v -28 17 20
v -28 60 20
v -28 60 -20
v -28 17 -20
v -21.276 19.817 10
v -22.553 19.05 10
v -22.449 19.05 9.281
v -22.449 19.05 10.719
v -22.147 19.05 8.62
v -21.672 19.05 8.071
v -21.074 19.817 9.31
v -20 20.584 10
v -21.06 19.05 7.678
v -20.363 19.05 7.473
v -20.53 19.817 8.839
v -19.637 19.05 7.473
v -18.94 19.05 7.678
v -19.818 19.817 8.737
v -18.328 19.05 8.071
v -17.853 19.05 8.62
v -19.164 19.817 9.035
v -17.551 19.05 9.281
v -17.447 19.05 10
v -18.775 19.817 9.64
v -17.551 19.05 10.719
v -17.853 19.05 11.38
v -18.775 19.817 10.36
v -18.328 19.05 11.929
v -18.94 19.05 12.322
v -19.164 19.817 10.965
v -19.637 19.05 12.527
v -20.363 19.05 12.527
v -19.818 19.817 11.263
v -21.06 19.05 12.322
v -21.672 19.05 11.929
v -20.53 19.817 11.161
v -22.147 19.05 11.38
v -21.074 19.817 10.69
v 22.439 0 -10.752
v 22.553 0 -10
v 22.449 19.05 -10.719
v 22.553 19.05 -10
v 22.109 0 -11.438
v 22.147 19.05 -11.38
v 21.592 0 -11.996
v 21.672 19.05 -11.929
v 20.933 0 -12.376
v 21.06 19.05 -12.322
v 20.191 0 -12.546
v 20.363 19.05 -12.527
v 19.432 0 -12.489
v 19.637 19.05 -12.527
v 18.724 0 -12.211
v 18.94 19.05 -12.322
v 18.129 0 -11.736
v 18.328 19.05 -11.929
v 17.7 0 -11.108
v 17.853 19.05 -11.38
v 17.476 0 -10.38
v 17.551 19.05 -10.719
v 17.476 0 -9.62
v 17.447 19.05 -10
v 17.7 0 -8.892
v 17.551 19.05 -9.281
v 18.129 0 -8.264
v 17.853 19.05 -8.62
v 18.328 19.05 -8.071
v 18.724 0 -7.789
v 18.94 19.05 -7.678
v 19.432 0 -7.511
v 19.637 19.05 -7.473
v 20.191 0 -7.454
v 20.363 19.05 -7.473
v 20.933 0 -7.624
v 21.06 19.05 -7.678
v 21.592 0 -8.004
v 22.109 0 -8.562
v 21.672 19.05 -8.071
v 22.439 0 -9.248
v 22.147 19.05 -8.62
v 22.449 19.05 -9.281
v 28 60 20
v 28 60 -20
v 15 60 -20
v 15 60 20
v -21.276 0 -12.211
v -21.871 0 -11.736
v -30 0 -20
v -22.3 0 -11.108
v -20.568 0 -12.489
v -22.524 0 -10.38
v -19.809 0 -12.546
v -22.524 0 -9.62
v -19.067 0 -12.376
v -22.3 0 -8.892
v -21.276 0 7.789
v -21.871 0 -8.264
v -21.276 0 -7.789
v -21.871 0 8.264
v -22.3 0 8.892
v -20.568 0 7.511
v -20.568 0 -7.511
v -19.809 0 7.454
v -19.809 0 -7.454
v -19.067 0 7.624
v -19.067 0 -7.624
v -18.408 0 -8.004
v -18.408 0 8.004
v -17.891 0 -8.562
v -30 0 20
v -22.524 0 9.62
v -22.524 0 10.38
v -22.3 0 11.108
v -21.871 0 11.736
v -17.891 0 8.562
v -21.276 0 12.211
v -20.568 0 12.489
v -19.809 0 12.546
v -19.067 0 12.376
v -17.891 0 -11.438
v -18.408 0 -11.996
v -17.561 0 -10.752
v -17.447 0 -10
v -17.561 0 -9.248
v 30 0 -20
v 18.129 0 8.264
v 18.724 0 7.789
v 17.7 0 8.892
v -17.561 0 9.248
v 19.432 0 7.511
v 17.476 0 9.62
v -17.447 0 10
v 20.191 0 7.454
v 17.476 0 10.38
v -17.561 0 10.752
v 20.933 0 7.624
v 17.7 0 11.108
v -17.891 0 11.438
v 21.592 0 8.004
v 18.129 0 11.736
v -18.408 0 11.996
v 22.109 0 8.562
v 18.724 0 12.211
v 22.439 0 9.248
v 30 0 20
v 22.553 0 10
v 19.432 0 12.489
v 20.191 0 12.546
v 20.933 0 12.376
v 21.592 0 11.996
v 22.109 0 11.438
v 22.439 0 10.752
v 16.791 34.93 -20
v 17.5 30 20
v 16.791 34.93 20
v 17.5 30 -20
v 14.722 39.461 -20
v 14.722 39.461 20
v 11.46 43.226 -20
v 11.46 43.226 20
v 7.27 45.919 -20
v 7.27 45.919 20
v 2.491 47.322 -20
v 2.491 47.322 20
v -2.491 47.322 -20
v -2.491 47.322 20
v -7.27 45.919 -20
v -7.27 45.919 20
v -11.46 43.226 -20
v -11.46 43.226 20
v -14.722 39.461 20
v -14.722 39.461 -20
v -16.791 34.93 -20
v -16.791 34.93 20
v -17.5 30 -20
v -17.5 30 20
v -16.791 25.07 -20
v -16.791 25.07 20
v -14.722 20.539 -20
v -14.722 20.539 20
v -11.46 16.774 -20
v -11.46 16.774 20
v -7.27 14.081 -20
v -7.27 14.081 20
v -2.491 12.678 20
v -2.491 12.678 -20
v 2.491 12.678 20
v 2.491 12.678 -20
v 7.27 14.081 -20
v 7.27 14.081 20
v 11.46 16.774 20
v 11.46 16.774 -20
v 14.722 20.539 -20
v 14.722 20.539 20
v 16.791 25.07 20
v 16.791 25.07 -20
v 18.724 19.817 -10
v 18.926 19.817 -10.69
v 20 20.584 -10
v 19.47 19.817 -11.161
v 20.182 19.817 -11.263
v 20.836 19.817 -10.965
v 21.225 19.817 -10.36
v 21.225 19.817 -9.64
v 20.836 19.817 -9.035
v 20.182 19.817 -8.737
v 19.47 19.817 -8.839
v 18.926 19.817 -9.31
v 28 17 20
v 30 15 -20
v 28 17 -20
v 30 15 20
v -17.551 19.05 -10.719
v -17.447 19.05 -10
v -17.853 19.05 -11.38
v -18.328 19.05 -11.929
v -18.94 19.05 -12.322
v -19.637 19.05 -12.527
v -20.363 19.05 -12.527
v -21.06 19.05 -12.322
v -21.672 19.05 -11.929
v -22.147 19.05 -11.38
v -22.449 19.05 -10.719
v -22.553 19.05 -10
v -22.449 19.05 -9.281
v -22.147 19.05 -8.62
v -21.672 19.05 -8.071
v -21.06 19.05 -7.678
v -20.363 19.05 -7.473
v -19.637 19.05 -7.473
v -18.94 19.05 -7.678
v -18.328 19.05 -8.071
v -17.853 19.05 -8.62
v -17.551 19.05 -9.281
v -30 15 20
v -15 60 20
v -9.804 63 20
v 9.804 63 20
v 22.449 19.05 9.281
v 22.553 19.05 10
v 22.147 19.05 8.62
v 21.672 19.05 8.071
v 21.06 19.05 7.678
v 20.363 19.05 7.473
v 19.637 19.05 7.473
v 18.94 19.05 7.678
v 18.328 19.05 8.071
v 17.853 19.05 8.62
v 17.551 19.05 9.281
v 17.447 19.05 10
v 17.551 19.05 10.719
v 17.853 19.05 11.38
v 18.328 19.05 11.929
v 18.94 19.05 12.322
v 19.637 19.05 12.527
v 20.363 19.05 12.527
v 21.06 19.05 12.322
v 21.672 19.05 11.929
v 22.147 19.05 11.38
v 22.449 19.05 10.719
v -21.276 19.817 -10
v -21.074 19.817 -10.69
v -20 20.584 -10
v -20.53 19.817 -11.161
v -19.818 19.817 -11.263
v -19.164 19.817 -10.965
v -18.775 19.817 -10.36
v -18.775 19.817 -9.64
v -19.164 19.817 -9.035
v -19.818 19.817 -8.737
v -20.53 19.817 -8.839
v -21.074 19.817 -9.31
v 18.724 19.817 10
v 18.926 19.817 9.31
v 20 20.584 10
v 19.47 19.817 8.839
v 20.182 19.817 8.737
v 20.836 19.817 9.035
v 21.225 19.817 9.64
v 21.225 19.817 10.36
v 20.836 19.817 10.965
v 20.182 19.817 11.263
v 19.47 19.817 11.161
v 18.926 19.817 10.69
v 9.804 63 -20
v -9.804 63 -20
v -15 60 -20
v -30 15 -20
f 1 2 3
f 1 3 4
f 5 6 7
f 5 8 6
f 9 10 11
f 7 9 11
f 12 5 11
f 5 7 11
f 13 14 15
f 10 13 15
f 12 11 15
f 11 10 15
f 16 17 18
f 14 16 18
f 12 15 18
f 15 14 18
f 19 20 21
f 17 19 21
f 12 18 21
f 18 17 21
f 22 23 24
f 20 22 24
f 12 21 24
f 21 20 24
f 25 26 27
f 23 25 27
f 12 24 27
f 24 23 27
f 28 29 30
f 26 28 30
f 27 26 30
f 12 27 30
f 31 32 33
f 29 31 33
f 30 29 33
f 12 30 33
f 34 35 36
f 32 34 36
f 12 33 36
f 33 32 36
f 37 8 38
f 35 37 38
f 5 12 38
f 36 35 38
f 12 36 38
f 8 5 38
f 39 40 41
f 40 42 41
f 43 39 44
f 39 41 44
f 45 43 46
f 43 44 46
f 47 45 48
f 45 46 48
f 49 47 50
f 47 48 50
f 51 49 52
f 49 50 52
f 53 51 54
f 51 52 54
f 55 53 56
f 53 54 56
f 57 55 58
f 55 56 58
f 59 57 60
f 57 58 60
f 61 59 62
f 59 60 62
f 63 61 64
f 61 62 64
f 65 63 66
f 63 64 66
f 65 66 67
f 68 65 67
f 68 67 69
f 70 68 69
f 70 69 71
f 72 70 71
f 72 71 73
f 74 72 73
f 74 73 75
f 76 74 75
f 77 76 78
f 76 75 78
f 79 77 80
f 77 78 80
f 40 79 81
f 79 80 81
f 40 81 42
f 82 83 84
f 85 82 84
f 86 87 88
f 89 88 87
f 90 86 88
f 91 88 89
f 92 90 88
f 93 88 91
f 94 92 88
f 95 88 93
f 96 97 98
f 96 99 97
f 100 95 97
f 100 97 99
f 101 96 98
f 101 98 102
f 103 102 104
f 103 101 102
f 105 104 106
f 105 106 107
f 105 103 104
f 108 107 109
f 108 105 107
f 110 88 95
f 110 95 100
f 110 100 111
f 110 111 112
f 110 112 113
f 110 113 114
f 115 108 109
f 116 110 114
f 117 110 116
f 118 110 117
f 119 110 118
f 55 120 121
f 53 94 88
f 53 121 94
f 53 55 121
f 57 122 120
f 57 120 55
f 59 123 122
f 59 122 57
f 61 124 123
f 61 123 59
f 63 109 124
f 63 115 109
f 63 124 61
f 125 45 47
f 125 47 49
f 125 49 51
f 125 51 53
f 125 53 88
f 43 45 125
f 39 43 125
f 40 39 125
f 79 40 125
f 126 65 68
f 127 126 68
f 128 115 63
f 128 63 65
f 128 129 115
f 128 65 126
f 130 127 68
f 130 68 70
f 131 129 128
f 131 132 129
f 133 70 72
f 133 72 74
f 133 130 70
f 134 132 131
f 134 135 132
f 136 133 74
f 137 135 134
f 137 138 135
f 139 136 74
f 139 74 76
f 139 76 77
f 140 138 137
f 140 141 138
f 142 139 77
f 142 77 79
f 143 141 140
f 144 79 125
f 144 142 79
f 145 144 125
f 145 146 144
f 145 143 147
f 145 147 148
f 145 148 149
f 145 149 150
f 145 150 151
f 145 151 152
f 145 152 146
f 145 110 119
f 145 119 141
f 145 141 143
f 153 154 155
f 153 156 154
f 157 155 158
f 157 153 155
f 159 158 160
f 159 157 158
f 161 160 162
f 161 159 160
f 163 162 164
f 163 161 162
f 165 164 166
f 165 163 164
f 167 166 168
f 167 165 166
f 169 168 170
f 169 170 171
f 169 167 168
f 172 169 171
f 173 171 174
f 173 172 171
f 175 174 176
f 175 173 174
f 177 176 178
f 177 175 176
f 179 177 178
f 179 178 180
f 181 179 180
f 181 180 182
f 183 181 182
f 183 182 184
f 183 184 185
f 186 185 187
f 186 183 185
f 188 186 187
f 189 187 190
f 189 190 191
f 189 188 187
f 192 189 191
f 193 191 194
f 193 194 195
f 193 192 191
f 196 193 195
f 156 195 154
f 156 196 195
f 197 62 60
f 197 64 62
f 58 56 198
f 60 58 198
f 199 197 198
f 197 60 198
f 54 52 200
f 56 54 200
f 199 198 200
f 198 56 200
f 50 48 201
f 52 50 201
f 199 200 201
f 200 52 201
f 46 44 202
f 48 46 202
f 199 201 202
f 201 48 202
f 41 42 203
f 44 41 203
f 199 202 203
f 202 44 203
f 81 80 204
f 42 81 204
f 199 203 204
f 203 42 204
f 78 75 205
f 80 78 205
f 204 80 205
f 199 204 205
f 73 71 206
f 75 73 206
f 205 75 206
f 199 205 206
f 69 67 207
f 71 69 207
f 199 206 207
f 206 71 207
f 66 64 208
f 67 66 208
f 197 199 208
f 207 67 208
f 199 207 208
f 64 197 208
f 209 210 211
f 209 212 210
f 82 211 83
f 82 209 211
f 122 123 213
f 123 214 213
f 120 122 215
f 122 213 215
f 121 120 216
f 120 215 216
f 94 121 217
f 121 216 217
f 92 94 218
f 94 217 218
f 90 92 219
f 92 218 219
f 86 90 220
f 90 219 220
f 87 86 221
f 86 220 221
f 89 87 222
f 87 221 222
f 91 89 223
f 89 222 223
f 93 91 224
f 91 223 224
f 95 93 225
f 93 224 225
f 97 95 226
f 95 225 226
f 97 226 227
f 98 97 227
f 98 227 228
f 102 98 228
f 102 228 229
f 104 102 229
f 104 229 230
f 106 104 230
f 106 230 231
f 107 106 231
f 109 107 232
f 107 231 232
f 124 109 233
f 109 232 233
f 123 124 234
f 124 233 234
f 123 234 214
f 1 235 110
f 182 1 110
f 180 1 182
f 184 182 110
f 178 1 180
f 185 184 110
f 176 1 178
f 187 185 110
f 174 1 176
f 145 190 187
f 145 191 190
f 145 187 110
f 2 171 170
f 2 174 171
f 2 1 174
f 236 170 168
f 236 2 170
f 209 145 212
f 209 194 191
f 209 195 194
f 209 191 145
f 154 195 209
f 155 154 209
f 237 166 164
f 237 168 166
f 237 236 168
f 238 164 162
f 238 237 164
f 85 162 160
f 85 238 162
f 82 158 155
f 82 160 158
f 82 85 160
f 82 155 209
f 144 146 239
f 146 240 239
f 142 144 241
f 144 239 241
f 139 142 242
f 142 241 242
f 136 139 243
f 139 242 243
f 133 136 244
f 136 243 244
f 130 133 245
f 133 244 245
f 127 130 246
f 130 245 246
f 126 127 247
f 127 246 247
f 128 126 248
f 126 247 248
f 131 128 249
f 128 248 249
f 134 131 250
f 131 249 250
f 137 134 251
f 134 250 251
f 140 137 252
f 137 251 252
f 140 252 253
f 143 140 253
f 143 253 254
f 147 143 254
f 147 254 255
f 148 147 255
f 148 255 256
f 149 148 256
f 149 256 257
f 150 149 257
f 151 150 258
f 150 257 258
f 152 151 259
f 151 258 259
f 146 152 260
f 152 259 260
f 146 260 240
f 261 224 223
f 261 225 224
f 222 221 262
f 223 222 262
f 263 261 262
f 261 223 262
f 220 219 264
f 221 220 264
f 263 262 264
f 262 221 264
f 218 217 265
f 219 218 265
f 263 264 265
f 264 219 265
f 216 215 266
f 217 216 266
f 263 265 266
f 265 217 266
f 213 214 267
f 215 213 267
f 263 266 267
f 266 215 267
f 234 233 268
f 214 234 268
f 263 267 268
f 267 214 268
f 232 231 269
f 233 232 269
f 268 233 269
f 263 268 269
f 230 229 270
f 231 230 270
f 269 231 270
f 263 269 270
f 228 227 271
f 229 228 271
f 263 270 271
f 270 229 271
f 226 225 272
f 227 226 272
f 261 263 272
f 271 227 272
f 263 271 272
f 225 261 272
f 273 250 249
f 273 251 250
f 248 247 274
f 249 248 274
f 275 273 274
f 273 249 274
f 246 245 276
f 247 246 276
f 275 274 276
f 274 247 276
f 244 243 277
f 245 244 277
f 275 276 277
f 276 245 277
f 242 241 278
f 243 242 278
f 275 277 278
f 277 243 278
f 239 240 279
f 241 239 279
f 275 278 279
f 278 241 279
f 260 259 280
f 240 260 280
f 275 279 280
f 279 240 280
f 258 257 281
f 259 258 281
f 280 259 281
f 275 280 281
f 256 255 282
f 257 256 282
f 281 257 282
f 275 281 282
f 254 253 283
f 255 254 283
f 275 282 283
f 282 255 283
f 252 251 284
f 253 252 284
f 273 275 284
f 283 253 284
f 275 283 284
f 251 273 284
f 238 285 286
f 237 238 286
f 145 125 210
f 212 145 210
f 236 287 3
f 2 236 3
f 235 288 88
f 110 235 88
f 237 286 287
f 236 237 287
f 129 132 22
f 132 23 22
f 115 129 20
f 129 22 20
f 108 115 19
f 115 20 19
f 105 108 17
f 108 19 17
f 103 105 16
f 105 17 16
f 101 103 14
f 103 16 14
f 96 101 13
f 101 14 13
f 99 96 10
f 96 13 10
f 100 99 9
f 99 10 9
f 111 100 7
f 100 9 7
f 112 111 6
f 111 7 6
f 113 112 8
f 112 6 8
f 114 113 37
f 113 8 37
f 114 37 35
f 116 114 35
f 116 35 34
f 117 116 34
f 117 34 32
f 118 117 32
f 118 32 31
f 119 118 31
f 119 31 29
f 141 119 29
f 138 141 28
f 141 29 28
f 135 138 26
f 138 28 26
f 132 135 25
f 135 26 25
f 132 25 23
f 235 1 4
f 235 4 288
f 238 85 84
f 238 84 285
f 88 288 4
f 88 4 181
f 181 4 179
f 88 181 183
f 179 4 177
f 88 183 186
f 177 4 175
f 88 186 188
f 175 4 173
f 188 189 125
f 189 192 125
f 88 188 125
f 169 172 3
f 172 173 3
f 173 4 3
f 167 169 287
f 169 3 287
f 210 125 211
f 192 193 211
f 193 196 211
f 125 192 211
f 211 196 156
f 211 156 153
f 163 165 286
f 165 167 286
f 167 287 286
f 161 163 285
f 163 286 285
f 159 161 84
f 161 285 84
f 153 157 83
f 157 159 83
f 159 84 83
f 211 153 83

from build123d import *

# Parameters (mm, degrees)
CROQUIS1_R                    = 17.5
SALIENTE_EXTRUIR1_DEPTH       = 20
TALADRO_ROSCADO_1_4_201_D     = 5.1054
TALADRO_ROSCADO_1_4_201_DEPTH = 19.05
TALADRO_ROSCADO_1_4_201_TIP   = 1.533816902


with BuildPart() as part:
    # Croquis1 → Saliente-Extruir1 (new, symmetric)
    with BuildSketch(Plane.XY):
        Polygon((28, 60), (15, 60), (9.803847577, 63), (-9.803847577, 63), (-15, 60), (-28, 60), (-28, 17), (-30, 15), (-30, 0), (30, 0), (30, 15), (28, 17), align=None)
        with Locations((0, 30)):
            Circle(CROQUIS1_R, mode=Mode.SUBTRACT)
    extrude(amount=SALIENTE_EXTRUIR1_DEPTH, both=True)

    # Taladro roscado 1/4-201
    with Locations(Plane(origin=(0, 0, 0), x_dir=(-1, 0, 0), z_dir=(0, -1, 0))):
        with Locations((20, 10), (20, -10), (-20, -10), (-20, 10)):
            Hole(TALADRO_ROSCADO_1_4_201_D / 2, depth=TALADRO_ROSCADO_1_4_201_DEPTH)
            with Locations((0, 0, -(TALADRO_ROSCADO_1_4_201_DEPTH + TALADRO_ROSCADO_1_4_201_TIP / 2))):  # 118° drill point
                Cone(0, TALADRO_ROSCADO_1_4_201_D / 2, TALADRO_ROSCADO_1_4_201_TIP, mode=Mode.SUBTRACT)


solid = part.part
